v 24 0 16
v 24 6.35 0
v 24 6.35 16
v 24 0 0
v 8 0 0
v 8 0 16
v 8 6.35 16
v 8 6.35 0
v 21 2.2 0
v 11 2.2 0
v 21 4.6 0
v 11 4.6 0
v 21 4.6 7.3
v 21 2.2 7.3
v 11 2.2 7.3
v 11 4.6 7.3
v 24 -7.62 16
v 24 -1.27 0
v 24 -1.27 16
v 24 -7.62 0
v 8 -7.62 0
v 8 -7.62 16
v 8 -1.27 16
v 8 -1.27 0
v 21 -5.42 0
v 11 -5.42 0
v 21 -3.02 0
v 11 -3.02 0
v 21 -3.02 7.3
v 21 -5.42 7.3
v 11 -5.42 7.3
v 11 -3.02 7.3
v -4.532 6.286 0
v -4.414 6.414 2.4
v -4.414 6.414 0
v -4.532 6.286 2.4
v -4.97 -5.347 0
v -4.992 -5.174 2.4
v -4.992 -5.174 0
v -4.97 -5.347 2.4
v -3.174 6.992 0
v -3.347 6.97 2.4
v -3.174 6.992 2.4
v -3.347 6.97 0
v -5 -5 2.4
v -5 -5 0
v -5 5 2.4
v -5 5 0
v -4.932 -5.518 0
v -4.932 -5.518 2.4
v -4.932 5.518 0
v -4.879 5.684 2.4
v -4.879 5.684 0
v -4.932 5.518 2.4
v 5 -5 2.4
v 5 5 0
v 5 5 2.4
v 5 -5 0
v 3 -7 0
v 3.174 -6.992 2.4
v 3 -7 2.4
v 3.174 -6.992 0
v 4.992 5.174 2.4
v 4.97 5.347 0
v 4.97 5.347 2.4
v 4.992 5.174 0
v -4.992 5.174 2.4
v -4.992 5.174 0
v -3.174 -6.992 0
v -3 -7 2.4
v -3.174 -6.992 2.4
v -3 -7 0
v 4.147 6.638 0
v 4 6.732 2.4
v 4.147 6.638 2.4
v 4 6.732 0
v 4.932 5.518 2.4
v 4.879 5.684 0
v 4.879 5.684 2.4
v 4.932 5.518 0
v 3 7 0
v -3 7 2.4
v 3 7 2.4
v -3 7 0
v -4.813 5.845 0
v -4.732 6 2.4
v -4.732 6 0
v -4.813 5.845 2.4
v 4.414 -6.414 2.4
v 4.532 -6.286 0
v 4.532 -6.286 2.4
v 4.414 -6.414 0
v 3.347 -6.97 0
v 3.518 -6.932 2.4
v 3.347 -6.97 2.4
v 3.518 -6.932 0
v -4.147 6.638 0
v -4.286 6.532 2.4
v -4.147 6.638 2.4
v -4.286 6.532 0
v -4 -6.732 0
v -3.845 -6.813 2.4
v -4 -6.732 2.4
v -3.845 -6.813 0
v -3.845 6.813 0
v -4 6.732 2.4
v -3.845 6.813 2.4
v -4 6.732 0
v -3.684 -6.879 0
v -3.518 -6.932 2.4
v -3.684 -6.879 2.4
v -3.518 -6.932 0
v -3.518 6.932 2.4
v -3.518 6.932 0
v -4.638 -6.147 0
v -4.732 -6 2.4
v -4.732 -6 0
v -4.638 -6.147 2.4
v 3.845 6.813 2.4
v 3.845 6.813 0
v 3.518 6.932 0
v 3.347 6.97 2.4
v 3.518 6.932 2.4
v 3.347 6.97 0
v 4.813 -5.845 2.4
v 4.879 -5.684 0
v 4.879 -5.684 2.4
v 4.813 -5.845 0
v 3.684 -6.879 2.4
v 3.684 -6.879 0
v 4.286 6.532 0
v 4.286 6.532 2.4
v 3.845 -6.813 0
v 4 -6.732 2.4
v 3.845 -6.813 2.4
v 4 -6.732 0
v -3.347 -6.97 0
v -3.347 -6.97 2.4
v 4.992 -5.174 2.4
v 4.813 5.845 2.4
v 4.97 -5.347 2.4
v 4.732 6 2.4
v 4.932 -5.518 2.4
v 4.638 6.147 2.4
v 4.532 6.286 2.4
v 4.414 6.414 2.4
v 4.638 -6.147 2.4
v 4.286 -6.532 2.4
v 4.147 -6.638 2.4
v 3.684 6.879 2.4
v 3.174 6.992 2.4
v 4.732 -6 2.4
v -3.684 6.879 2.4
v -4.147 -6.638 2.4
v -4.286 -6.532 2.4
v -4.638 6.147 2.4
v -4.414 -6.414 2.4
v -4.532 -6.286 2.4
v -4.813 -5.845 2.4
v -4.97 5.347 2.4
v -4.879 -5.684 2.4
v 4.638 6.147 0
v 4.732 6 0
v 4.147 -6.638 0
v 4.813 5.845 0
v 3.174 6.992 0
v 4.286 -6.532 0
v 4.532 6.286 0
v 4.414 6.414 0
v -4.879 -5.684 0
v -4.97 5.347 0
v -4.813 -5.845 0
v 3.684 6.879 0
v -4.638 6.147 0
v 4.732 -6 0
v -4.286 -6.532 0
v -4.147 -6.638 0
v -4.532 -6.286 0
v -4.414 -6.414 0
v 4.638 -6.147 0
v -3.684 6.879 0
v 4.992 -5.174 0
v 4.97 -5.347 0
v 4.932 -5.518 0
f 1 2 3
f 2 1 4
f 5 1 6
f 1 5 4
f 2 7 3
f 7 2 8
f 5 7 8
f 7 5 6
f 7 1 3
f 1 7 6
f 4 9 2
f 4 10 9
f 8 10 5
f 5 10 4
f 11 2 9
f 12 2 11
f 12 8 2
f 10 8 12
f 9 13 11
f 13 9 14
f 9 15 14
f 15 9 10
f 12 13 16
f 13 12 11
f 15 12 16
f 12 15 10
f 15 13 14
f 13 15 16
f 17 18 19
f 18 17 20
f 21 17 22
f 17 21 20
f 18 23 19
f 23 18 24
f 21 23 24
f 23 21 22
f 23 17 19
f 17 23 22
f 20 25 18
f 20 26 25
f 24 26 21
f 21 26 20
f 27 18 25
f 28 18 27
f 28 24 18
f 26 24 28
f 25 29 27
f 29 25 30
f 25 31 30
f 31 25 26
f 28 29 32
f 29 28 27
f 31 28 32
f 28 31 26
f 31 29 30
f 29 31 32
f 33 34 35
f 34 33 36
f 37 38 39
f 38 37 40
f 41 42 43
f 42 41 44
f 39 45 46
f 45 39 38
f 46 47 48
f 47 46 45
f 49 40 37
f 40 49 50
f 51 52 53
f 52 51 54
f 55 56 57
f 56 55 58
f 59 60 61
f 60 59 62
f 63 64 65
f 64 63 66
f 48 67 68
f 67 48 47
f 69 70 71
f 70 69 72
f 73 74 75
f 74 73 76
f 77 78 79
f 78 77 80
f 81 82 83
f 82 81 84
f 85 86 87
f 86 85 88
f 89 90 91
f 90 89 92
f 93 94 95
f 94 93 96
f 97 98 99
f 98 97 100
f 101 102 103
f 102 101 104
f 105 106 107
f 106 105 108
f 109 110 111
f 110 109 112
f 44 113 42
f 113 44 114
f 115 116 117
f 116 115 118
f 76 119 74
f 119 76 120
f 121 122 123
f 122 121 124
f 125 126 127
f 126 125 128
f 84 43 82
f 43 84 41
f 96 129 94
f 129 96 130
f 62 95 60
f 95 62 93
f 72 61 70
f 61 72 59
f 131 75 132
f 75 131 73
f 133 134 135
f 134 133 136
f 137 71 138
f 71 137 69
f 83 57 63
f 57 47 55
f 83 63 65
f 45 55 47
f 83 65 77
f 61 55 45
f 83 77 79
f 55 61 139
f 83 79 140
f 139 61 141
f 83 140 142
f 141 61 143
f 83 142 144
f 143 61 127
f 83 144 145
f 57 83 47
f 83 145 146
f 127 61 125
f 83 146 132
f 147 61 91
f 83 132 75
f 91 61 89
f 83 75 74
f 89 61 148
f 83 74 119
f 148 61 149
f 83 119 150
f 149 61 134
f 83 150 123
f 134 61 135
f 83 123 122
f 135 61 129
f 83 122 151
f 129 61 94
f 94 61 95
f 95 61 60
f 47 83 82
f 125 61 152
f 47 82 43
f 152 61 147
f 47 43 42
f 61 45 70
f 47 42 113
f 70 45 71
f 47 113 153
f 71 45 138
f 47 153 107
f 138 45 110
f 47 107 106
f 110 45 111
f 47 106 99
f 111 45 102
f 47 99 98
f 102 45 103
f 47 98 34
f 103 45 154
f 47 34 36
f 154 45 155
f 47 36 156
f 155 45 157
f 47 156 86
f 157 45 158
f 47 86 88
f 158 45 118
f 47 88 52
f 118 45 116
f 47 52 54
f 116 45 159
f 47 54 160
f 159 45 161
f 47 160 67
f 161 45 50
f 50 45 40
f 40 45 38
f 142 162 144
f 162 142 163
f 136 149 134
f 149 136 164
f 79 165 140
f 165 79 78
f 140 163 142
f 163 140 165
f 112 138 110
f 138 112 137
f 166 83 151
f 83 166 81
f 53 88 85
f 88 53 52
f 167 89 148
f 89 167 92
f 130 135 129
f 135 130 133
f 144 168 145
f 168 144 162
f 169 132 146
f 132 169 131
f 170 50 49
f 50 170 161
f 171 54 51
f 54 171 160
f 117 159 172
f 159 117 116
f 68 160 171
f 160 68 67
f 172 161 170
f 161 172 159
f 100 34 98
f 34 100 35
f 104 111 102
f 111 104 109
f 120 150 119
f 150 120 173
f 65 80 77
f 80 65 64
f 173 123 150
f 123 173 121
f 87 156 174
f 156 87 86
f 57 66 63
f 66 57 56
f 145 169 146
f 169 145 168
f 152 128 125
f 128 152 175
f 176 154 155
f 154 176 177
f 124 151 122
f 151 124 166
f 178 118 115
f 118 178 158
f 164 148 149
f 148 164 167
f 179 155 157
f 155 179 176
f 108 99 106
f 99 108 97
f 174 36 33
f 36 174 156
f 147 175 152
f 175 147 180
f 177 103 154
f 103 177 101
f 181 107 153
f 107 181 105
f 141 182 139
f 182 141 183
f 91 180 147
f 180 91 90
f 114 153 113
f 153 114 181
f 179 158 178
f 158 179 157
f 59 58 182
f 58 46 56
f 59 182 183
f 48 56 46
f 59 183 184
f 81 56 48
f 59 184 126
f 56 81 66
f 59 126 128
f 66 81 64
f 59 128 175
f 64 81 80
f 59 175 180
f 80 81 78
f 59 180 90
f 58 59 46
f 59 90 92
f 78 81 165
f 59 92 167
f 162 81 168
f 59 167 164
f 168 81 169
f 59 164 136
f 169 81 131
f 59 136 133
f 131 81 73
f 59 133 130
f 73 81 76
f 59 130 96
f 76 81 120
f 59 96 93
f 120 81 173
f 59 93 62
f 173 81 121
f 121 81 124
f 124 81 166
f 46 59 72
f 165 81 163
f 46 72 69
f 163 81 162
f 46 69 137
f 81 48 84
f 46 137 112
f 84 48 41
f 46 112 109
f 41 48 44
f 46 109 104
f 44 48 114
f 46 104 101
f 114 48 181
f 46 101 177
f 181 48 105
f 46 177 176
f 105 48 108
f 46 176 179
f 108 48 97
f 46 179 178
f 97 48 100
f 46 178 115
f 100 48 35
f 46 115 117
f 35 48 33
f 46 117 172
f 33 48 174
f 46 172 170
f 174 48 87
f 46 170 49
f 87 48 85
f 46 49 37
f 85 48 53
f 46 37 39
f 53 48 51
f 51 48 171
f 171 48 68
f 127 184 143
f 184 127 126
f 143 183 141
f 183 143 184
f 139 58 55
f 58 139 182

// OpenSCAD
// file: components/biscuit/slot.scad
module biscuitSlot() {
    translate([0,0,-biscuitSlotDepth])
    cube([
        biscuitWidth + biscuitRadius + insertionTolerance * 2,
        biscuitLength * 1.05 + biscuitRadius + insertionTolerance * 2,
        biscuitThickness + insertionTolerance
    ], center = true);
}
// file: components/biscuit/biscuit.scad
module biscuit() {
    hull() {
        for(x = [-1,1])
        for(y = [-1,1])
            translate([
                x * (biscuitWidth - biscuitRadius)/2,
                y * (biscuitLength - biscuitRadius) / 2,
                0
            ])
            cylinder(biscuitThickness, r=biscuitRadius, center=true);
    }
}
// file: components/biscuit/config.scad
biscuitWidth = 8;
biscuitLength = 12;
biscuitThickness = 2.4;
biscuitRadius = 2;
biscuitSlotDepth = biscuitThickness + 1;
// file: my-bb8-config.scad
$fnBody = 360 / ($preview ? 5 : 2);
$fn = 360/ ($preview ? 10 : 5);
$fnDetail = $preview ? 15 : 60;

smallPrintBed = false;

millisPerInch = 25.4;
radius = 253; // rimstar.org has it at diameter of both 506 and 508 in different spots, but this is what I started at, so I'm keeping it for the moment.
wallThickness = 0.5 * millisPerInch;
camlockNutRadius = 2.6;
camlockNutThickness = wallThickness * 0.6;
camlockNutWallThickness = 1.6;
camlockNutMaxDepth = 10;
camlockNutGripSize = 1;
camlockBoltRadius = 2.5;
camlockBoltLength = 25;
fittedTolerance = 0.3;
pinRadius = camlockBoltRadius;
pinLength = camlockBoltLength;
adjacentCamlockOffsetStart = 7.5;
adjacentCamlockOffsetStep = 7.5;
adjacentCamlockOffsetMax = 20;
panelOverlapFactor = 0;
maxLip = 0;
ringLocksPerQuadrant = 6;

include <shared.scad>;
// main file
include <my-bb8-config.scad>;
include <components/biscuit/config.scad>;
include <components/biscuit/biscuit.scad>;
include <components/biscuit/slot.scad>;

blockSize = max(biscuitLength, biscuitWidth * 2);
wallThickness=millisPerInch/4;
insertionTolerance = 0;

translate([0,0,biscuitThickness / 2])
biscuit();

rotate([90,0,0])
for(offset=[0,1])
translate([blockSize,0,offset * wallThickness * 1.2])
difference()
{
    translate([-blockSize / 2,0,-wallThickness])
    cube([
        blockSize,
        blockSize,
        wallThickness
    ]);

    {
        %camLockSlot(boltLength=camlockBoltLength);
        biscuitSlot();
    }
}


%translate([0,0,0])
    {
        biscuitSlot();
    }
